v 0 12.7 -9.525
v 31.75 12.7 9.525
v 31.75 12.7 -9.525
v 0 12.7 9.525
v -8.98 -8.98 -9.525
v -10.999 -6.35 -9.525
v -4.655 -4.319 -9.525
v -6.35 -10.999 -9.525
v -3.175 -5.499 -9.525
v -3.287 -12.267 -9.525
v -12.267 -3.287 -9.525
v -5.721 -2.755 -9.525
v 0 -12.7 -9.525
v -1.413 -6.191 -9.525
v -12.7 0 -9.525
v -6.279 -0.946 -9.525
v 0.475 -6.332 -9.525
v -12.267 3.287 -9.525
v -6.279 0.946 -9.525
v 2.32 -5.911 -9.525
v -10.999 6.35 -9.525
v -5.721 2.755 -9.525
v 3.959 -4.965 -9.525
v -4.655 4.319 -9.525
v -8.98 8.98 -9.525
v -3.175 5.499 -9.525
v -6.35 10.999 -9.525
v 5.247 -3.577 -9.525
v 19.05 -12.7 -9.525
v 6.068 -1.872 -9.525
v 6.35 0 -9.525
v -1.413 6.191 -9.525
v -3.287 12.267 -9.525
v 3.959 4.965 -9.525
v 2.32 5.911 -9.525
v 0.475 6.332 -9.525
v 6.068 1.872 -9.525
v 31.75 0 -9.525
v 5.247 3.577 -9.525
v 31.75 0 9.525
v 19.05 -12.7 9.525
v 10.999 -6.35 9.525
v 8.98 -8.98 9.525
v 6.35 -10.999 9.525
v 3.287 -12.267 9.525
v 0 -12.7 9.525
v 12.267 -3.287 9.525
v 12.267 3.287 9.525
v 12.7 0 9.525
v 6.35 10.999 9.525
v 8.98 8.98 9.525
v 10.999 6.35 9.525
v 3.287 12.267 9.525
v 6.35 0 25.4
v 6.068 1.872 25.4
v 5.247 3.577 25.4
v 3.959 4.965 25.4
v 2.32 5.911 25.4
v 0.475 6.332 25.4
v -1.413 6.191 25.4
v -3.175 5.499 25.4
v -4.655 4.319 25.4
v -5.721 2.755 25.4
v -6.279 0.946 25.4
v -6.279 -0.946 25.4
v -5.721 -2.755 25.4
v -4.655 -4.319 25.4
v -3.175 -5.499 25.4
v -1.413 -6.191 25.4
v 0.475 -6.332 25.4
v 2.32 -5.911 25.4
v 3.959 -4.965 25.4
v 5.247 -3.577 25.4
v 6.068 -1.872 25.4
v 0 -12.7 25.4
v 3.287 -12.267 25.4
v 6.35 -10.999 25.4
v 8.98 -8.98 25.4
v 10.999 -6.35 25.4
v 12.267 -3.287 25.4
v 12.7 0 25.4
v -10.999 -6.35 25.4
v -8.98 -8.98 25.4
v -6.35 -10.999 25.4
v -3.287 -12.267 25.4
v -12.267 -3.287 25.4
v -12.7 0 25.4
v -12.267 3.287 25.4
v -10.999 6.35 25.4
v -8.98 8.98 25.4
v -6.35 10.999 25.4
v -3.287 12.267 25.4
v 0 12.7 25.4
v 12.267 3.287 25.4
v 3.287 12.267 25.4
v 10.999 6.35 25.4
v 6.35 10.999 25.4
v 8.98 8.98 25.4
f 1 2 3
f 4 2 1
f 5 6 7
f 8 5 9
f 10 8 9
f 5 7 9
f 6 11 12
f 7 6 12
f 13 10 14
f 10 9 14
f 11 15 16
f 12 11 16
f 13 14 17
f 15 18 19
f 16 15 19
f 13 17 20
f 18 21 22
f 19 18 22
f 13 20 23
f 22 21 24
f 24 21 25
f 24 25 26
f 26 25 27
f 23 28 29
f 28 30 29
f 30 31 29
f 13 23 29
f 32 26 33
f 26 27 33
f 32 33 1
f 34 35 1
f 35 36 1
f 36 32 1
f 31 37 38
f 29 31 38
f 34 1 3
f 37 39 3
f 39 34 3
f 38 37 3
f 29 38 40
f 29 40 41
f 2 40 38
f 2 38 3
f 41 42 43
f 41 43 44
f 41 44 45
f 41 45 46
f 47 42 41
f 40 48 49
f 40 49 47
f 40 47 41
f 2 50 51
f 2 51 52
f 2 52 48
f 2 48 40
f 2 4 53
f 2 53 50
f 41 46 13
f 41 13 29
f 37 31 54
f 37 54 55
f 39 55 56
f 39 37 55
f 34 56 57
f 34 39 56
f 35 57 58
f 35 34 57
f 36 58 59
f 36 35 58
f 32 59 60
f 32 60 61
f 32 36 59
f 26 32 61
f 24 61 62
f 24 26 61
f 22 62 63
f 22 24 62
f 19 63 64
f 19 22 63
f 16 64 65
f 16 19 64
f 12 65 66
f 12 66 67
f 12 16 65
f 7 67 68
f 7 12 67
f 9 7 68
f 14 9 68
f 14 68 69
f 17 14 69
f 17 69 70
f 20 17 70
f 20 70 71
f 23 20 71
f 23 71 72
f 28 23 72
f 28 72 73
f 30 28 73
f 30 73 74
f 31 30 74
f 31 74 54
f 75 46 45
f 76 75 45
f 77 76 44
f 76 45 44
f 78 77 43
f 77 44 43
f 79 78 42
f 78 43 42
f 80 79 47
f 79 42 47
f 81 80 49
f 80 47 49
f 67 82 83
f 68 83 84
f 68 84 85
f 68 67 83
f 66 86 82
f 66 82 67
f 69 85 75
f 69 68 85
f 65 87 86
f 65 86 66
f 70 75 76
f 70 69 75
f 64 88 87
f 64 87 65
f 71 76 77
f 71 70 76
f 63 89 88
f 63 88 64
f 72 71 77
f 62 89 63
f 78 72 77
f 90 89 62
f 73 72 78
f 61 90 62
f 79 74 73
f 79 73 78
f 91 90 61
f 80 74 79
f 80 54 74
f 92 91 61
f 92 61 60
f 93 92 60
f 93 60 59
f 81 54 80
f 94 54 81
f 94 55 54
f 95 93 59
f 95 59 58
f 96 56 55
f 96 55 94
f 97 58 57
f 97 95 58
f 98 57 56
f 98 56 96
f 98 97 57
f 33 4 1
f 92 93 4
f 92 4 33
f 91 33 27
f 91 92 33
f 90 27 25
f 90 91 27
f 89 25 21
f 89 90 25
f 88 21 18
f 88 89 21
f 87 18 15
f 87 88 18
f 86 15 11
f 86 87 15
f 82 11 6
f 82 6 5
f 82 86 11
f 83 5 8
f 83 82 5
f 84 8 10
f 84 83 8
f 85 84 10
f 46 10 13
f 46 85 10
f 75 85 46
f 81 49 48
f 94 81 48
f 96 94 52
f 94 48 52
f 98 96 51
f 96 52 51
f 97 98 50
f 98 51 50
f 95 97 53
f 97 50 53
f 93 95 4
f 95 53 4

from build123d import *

# Parameters (mm, degrees)
F0_R     = 6.35
F1_DEPTH = 25.4
F2_DEPTH = 9.525
F4_DEPTH = 12.7


with BuildPart() as f1:
    # F0 (on Top) → F1 (new body)
    with BuildSketch(Plane.XY):
        with BuildLine():
            ThreePointArc((0, -12.7), (8.980256, -8.980256), (12.7, 0))
            ThreePointArc((12.7, 0), (8.980256, 8.980256), (0, 12.7))
            ThreePointArc((0, 12.7), (-12.7, 0), (0, -12.7))
        make_face()
        Circle(F0_R, mode=Mode.SUBTRACT)
    extrude(amount=F1_DEPTH)

    # F0 (on Top) → F2 (join, symmetric)
    with BuildSketch(Plane.XY):
        with BuildLine():
            ThreePointArc((0, -12.7), (8.980256, -8.980256), (12.7, 0))
            ThreePointArc((12.7, 0), (8.980256, 8.980256), (0, 12.7))
            ThreePointArc((0, 12.7), (-12.7, 0), (0, -12.7))
        make_face()
        Circle(F0_R, mode=Mode.SUBTRACT)
        with BuildLine():
            ThreePointArc((0, 12.7), (8.980256, 8.980256), (12.7, 0))
            ThreePointArc((12.7, 0), (8.980256, -8.980256), (0, -12.7))
            Line((0, -12.7), (31.75, -12.7))
            Line((31.75, -12.7), (31.75, 12.7))
            Line((31.75, 12.7), (0, 12.7))
        make_face()
    extrude(amount=F2_DEPTH, both=True)

    # F3 (on Top) → F4 (cut, symmetric)
    with BuildSketch(Plane.XY):
        Polygon((31.75, 0), (19.05, -12.7), (31.75, -12.7), align=None)
    extrude(amount=F4_DEPTH, both=True, mode=Mode.SUBTRACT)


solid = f1.part
